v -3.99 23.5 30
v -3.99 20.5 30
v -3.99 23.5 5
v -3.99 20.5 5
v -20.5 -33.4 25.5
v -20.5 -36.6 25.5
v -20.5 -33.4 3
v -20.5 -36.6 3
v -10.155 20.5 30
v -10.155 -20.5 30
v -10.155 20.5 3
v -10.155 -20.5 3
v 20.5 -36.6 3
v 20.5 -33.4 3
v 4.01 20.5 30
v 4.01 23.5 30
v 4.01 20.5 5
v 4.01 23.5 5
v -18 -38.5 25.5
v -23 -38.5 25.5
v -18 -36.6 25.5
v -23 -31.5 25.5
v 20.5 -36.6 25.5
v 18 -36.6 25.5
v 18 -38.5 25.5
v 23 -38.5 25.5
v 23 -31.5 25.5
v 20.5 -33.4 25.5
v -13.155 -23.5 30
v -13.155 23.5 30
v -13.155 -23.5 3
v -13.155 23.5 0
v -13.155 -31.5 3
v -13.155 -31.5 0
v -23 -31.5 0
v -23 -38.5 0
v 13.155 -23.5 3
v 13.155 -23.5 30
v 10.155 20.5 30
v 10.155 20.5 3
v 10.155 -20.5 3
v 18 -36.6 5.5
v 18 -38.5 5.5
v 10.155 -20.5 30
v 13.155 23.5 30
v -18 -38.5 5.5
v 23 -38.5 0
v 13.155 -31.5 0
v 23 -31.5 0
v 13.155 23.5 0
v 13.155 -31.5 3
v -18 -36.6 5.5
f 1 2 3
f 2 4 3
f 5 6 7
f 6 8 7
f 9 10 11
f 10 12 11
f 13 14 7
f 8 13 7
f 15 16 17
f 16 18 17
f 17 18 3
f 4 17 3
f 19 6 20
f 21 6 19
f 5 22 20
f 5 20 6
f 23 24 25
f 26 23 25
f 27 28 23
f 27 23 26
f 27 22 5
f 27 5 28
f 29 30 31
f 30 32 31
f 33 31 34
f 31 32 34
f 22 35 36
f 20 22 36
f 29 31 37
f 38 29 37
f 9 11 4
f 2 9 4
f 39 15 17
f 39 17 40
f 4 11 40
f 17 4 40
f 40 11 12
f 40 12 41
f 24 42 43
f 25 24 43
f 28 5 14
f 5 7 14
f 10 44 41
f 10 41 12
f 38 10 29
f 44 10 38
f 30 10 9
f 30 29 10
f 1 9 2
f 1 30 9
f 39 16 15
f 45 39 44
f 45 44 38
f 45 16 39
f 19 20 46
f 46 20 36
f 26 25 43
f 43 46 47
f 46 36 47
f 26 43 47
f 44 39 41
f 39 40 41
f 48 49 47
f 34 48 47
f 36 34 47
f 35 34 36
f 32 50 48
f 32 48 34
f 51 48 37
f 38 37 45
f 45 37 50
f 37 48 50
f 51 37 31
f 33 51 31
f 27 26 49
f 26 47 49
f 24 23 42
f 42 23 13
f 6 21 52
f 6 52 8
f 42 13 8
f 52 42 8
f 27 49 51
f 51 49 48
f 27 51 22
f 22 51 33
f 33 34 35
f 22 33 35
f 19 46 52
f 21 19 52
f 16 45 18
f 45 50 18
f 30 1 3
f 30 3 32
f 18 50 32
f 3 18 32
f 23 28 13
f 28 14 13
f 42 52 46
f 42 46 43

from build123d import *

# Parameters (mm, degrees)
SKETCH1_W           = 20.31
SKETCH1_H           = 41
BOSS_EXTRUDE1_DEPTH = 3
SKETCH2_W           = 26.31
SKETCH2_H           = 47
SKETCH2_W_2         = 20.31
SKETCH2_H_2         = 41
BOSS_EXTRUDE2_DEPTH = 5
SKETCH3_W           = 26.31
SKETCH3_H           = 8
BOSS_EXTRUDE3_DEPTH = 3
SKETCH4_W           = 46
SKETCH4_H           = 1.9
BOSS_EXTRUDE4_DEPTH = 5.5
SKETCH5_W           = 46
SKETCH5_H           = 3.2
BOSS_EXTRUDE5_DEPTH = 3
BOSS_EXTRUDE6_DEPTH = 5
SKETCH8_W           = 2.5
SKETCH8_H           = 3.2
BOSS_EXTRUDE7_DEPTH = 2.5
BOSS_EXTRUDE8_DEPTH = 20
BOSS_EXTRUDE9_DEPTH = 20


with BuildPart() as part:
    # Sketch1 → Boss-Extrude1 (new body)
    with BuildSketch(Plane.XY):
        Rectangle(SKETCH1_W, SKETCH1_H)
    extrude(amount=BOSS_EXTRUDE1_DEPTH)

    # Sketch2 → Boss-Extrude2 (add)
    with BuildSketch(Plane(origin=(0, 0, 0), x_dir=(-1, 0, 0), z_dir=(0, 0, -1))):
        Rectangle(SKETCH2_W, SKETCH2_H)
        Rectangle(SKETCH2_W_2, SKETCH2_H_2, mode=Mode.SUBTRACT)
    extrude(amount=-BOSS_EXTRUDE2_DEPTH)

    # Sketch3 → Boss-Extrude3 (add)
    with BuildSketch(Plane(origin=(0, 0, 0), x_dir=(-1, 0, 0), z_dir=(0, 0, -1))):
        with Locations((0, -27.5)):
            Rectangle(SKETCH3_W, SKETCH3_H)
    extrude(amount=-BOSS_EXTRUDE3_DEPTH)

    # Sketch4 → Boss-Extrude4 (add)
    with BuildSketch(Plane(origin=(0, 0, 0), x_dir=(-1, 0, 0), z_dir=(0, 0, -1))):
        with Locations((0, -37.55)):
            Rectangle(SKETCH4_W, SKETCH4_H)
        Polygon((13.155, -31.5), (0, -31.5), (-13.155, -31.5), (-23, -31.5), (-23, -33.4), (23, -33.4), (23, -31.5), align=None)
    extrude(amount=-BOSS_EXTRUDE4_DEPTH)


with BuildPart() as boss_extrude4_piece_1:
    # of the separate pieces the step leaves, piece 1, a body of its own (boss_extrude4_pieces)
    add(part.part.solids().sort_by_distance((-13.155, -31.5, 0))[0])



with BuildPart() as boss_extrude4_piece_2:
    # of the separate pieces the step leaves, piece 2, a body of its own (boss_extrude4_pieces)
    add(part.part.solids().sort_by_distance((-23, -38.5, 0))[0])


with BuildPart() as boss_extrude4_piece_1_1:
    add(boss_extrude4_piece_1.part)

    add(boss_extrude4_piece_2.part)  # Boss-Extrude5 merges Boss-Extrude4 piece 2
    # Sketch5 → Boss-Extrude5 (add)
    with BuildSketch(Plane(origin=(0, 0, 0), x_dir=(-1, 0, 0), z_dir=(0, 0, -1))):
        with Locations((0, -35)):
            Rectangle(SKETCH5_W, SKETCH5_H)
    extrude(amount=-BOSS_EXTRUDE5_DEPTH)

    # Sketch6 → Boss-Extrude6 (add)
    with BuildSketch(Plane.XY.offset(5)):
        Polygon((4.010497469, 23.5), (4.010497469, 20.5), (10.155, 20.5), (10.155, -20.5), (-10.155, -20.5), (-10.155, 20.5), (-3.989502531, 20.5), (-3.989502531, 23.5), (-13.155, 23.5), (-13.155, -23.5), (13.155, -23.5), (13.155, 23.5), align=None)
    extrude(amount=BOSS_EXTRUDE6_DEPTH)

    # Sketch8 → Boss-Extrude7 (add)
    with BuildSketch(Plane.XY.offset(3)):
        with Locations((-21.75, -35)):
            Rectangle(SKETCH8_W, SKETCH8_H)
        with Locations((21.75, -35)):
            Rectangle(SKETCH8_W, SKETCH8_H)
    extrude(amount=BOSS_EXTRUDE7_DEPTH)

    # Sketch9 → Boss-Extrude8 (add)
    with BuildSketch(Plane.XY.offset(5.5)):
        Polygon((-23, -31.5), (-23, -38.5), (-18, -38.5), (-18, -36.6), (-20.5, -36.6), (-20.5, -33.4), (20.5, -33.4), (20.5, -36.6), (18, -36.6), (18, -38.5), (23, -38.5), (23, -31.5), align=None)
    extrude(amount=BOSS_EXTRUDE8_DEPTH)

    # Sketch12 → Boss-Extrude9 (add)
    with BuildSketch(Plane.XY.offset(10)):
        Polygon((13.155, -23.5), (13.155, 23.5), (4.010497469, 23.5), (4.010497469, 20.5), (10.155, 20.5), (10.155, -20.5), (-10.155, -20.5), (-10.155, 20.5), (-3.989502531, 20.5), (-3.989502531, 23.5), (-13.155, 23.5), (-13.155, -23.5), align=None)
    extrude(amount=BOSS_EXTRUDE9_DEPTH)


solid = boss_extrude4_piece_1_1.part
